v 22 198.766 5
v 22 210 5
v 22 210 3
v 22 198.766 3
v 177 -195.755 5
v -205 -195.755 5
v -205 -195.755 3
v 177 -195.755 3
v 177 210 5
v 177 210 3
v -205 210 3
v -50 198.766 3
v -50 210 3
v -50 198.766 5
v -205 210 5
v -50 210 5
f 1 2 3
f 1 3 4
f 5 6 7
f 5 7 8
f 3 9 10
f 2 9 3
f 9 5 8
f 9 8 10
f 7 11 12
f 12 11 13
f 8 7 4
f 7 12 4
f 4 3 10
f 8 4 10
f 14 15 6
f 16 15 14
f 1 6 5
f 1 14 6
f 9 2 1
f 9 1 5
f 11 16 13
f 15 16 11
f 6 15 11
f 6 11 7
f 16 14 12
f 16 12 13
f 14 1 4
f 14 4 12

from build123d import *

# Parameters (mm, degrees)
BOSS_EXTRUDE1_DEPTH = 2
CUT_EXTRUDE1_START  = -29.245384
SKETCH2_W           = 382
SKETCH2_H           = 2
CUT_EXTRUDE1_DEPTH  = 29.245384


with BuildPart() as part:
    # Sketch1 → Boss-Extrude1 (new body)
    with BuildSketch(Plane.XY.offset(5)):
        Polygon((-50, 198.766085176), (-50, 210), (-205, 210), (-205, -225), (177, -225), (177, 210), (22, 210), (22, 198.766085176), align=None)
    extrude(amount=-BOSS_EXTRUDE1_DEPTH)

    # Sketch2 → Cut-Extrude1 (cut)
    with BuildSketch(Plane.XZ.offset(225).offset(CUT_EXTRUDE1_START)):
        with Locations((-14, 4)):
            Rectangle(SKETCH2_W, SKETCH2_H)
    extrude(amount=CUT_EXTRUDE1_DEPTH, mode=Mode.SUBTRACT)


solid = part.part
